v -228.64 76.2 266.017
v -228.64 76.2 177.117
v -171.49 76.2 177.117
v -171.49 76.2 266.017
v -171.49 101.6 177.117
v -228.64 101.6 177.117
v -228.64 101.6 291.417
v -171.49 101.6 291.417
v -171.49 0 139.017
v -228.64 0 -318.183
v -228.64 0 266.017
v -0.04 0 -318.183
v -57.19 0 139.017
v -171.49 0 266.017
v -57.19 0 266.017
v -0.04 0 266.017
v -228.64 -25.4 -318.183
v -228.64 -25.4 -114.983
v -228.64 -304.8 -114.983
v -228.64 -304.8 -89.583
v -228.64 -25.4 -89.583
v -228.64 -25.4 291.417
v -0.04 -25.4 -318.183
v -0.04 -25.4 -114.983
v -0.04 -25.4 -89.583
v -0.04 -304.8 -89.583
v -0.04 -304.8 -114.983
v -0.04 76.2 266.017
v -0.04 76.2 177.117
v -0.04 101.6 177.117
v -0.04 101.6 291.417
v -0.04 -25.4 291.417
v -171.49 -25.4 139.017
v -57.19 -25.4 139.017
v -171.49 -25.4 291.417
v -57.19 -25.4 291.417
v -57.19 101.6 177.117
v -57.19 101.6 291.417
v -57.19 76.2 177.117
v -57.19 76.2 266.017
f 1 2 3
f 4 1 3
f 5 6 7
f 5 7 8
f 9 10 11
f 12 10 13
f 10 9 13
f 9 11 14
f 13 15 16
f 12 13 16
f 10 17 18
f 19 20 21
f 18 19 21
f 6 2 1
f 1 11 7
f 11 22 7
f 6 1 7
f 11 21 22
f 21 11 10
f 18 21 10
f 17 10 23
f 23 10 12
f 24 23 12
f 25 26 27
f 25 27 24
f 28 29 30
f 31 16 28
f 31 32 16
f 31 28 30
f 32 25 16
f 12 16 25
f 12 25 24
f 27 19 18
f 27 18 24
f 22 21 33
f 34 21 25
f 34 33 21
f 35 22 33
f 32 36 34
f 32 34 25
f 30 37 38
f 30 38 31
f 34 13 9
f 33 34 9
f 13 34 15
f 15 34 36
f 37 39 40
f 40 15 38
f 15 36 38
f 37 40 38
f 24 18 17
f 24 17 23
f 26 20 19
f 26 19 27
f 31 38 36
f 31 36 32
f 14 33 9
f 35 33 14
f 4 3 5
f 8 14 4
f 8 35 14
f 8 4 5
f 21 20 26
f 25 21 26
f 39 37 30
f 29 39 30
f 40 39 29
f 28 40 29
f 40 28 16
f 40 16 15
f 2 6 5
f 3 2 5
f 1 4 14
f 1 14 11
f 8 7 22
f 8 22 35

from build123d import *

# Parameters (mm, degrees)
F1_DEPTH = 25.4
F2_W     = 57.15
F2_H     = 25.4
F3_DEPTH = 76.2
F4_W     = 57.15
F4_H     = 25.4
F5_DEPTH = 114.3
F6_W     = 57.15
F6_H     = 25.4
F7_DEPTH = 114.3
F8_W     = 228.6
F8_H     = 25.4
F9_DEPTH = 279.4


with BuildPart() as f1:
    # F0 (on Front) → F1 (new body)
    with BuildSketch(Plane.XZ):
        Polygon((-171.4900614394, 291.4170305759), (-228.6400614394, 291.4170305759), (-228.6400614394, -318.1829694241), (-0.0400614394, -318.1829694241), (-0.0400614394, 291.4170305759), (-57.1900614394, 291.4170305759), (-57.1900614394, 139.0170305759), (-171.4900614394, 139.0170305759), align=None)
    extrude(amount=F1_DEPTH)

    # F2 (on face) → F3 (join)
    with BuildSketch(Plane(origin=(0, 0, 0), x_dir=(-1, 0, 0), z_dir=(0, 1, 0))):
        with Locations((28.6150614394, 278.7170305759)):
            Rectangle(F2_W, F2_H)
        with Locations((200.0650614394, 278.7170305759)):
            Rectangle(F2_W, F2_H)
    extrude(amount=F3_DEPTH)

    # F4 (on face) → F5 (join)
    with BuildSketch(Plane.XY.offset(291.4170305759)):
        with Locations((-28.6150614394, 88.9)):
            Rectangle(F4_W, F4_H)
    extrude(amount=-F5_DEPTH)

    # F6 (on face) → F7 (join)
    with BuildSketch(Plane.XY.offset(291.4170305759)):
        with Locations((-200.0650614394, 88.9)):
            Rectangle(F6_W, F6_H)
    extrude(amount=-F7_DEPTH)

    # F8 (on face) → F9 (join)
    with BuildSketch(Plane.XZ.offset(25.4)):
        with Locations((-114.3400614394, -102.2829694241)):
            Rectangle(F8_W, F8_H)
    extrude(amount=F9_DEPTH)


solid = f1.part
